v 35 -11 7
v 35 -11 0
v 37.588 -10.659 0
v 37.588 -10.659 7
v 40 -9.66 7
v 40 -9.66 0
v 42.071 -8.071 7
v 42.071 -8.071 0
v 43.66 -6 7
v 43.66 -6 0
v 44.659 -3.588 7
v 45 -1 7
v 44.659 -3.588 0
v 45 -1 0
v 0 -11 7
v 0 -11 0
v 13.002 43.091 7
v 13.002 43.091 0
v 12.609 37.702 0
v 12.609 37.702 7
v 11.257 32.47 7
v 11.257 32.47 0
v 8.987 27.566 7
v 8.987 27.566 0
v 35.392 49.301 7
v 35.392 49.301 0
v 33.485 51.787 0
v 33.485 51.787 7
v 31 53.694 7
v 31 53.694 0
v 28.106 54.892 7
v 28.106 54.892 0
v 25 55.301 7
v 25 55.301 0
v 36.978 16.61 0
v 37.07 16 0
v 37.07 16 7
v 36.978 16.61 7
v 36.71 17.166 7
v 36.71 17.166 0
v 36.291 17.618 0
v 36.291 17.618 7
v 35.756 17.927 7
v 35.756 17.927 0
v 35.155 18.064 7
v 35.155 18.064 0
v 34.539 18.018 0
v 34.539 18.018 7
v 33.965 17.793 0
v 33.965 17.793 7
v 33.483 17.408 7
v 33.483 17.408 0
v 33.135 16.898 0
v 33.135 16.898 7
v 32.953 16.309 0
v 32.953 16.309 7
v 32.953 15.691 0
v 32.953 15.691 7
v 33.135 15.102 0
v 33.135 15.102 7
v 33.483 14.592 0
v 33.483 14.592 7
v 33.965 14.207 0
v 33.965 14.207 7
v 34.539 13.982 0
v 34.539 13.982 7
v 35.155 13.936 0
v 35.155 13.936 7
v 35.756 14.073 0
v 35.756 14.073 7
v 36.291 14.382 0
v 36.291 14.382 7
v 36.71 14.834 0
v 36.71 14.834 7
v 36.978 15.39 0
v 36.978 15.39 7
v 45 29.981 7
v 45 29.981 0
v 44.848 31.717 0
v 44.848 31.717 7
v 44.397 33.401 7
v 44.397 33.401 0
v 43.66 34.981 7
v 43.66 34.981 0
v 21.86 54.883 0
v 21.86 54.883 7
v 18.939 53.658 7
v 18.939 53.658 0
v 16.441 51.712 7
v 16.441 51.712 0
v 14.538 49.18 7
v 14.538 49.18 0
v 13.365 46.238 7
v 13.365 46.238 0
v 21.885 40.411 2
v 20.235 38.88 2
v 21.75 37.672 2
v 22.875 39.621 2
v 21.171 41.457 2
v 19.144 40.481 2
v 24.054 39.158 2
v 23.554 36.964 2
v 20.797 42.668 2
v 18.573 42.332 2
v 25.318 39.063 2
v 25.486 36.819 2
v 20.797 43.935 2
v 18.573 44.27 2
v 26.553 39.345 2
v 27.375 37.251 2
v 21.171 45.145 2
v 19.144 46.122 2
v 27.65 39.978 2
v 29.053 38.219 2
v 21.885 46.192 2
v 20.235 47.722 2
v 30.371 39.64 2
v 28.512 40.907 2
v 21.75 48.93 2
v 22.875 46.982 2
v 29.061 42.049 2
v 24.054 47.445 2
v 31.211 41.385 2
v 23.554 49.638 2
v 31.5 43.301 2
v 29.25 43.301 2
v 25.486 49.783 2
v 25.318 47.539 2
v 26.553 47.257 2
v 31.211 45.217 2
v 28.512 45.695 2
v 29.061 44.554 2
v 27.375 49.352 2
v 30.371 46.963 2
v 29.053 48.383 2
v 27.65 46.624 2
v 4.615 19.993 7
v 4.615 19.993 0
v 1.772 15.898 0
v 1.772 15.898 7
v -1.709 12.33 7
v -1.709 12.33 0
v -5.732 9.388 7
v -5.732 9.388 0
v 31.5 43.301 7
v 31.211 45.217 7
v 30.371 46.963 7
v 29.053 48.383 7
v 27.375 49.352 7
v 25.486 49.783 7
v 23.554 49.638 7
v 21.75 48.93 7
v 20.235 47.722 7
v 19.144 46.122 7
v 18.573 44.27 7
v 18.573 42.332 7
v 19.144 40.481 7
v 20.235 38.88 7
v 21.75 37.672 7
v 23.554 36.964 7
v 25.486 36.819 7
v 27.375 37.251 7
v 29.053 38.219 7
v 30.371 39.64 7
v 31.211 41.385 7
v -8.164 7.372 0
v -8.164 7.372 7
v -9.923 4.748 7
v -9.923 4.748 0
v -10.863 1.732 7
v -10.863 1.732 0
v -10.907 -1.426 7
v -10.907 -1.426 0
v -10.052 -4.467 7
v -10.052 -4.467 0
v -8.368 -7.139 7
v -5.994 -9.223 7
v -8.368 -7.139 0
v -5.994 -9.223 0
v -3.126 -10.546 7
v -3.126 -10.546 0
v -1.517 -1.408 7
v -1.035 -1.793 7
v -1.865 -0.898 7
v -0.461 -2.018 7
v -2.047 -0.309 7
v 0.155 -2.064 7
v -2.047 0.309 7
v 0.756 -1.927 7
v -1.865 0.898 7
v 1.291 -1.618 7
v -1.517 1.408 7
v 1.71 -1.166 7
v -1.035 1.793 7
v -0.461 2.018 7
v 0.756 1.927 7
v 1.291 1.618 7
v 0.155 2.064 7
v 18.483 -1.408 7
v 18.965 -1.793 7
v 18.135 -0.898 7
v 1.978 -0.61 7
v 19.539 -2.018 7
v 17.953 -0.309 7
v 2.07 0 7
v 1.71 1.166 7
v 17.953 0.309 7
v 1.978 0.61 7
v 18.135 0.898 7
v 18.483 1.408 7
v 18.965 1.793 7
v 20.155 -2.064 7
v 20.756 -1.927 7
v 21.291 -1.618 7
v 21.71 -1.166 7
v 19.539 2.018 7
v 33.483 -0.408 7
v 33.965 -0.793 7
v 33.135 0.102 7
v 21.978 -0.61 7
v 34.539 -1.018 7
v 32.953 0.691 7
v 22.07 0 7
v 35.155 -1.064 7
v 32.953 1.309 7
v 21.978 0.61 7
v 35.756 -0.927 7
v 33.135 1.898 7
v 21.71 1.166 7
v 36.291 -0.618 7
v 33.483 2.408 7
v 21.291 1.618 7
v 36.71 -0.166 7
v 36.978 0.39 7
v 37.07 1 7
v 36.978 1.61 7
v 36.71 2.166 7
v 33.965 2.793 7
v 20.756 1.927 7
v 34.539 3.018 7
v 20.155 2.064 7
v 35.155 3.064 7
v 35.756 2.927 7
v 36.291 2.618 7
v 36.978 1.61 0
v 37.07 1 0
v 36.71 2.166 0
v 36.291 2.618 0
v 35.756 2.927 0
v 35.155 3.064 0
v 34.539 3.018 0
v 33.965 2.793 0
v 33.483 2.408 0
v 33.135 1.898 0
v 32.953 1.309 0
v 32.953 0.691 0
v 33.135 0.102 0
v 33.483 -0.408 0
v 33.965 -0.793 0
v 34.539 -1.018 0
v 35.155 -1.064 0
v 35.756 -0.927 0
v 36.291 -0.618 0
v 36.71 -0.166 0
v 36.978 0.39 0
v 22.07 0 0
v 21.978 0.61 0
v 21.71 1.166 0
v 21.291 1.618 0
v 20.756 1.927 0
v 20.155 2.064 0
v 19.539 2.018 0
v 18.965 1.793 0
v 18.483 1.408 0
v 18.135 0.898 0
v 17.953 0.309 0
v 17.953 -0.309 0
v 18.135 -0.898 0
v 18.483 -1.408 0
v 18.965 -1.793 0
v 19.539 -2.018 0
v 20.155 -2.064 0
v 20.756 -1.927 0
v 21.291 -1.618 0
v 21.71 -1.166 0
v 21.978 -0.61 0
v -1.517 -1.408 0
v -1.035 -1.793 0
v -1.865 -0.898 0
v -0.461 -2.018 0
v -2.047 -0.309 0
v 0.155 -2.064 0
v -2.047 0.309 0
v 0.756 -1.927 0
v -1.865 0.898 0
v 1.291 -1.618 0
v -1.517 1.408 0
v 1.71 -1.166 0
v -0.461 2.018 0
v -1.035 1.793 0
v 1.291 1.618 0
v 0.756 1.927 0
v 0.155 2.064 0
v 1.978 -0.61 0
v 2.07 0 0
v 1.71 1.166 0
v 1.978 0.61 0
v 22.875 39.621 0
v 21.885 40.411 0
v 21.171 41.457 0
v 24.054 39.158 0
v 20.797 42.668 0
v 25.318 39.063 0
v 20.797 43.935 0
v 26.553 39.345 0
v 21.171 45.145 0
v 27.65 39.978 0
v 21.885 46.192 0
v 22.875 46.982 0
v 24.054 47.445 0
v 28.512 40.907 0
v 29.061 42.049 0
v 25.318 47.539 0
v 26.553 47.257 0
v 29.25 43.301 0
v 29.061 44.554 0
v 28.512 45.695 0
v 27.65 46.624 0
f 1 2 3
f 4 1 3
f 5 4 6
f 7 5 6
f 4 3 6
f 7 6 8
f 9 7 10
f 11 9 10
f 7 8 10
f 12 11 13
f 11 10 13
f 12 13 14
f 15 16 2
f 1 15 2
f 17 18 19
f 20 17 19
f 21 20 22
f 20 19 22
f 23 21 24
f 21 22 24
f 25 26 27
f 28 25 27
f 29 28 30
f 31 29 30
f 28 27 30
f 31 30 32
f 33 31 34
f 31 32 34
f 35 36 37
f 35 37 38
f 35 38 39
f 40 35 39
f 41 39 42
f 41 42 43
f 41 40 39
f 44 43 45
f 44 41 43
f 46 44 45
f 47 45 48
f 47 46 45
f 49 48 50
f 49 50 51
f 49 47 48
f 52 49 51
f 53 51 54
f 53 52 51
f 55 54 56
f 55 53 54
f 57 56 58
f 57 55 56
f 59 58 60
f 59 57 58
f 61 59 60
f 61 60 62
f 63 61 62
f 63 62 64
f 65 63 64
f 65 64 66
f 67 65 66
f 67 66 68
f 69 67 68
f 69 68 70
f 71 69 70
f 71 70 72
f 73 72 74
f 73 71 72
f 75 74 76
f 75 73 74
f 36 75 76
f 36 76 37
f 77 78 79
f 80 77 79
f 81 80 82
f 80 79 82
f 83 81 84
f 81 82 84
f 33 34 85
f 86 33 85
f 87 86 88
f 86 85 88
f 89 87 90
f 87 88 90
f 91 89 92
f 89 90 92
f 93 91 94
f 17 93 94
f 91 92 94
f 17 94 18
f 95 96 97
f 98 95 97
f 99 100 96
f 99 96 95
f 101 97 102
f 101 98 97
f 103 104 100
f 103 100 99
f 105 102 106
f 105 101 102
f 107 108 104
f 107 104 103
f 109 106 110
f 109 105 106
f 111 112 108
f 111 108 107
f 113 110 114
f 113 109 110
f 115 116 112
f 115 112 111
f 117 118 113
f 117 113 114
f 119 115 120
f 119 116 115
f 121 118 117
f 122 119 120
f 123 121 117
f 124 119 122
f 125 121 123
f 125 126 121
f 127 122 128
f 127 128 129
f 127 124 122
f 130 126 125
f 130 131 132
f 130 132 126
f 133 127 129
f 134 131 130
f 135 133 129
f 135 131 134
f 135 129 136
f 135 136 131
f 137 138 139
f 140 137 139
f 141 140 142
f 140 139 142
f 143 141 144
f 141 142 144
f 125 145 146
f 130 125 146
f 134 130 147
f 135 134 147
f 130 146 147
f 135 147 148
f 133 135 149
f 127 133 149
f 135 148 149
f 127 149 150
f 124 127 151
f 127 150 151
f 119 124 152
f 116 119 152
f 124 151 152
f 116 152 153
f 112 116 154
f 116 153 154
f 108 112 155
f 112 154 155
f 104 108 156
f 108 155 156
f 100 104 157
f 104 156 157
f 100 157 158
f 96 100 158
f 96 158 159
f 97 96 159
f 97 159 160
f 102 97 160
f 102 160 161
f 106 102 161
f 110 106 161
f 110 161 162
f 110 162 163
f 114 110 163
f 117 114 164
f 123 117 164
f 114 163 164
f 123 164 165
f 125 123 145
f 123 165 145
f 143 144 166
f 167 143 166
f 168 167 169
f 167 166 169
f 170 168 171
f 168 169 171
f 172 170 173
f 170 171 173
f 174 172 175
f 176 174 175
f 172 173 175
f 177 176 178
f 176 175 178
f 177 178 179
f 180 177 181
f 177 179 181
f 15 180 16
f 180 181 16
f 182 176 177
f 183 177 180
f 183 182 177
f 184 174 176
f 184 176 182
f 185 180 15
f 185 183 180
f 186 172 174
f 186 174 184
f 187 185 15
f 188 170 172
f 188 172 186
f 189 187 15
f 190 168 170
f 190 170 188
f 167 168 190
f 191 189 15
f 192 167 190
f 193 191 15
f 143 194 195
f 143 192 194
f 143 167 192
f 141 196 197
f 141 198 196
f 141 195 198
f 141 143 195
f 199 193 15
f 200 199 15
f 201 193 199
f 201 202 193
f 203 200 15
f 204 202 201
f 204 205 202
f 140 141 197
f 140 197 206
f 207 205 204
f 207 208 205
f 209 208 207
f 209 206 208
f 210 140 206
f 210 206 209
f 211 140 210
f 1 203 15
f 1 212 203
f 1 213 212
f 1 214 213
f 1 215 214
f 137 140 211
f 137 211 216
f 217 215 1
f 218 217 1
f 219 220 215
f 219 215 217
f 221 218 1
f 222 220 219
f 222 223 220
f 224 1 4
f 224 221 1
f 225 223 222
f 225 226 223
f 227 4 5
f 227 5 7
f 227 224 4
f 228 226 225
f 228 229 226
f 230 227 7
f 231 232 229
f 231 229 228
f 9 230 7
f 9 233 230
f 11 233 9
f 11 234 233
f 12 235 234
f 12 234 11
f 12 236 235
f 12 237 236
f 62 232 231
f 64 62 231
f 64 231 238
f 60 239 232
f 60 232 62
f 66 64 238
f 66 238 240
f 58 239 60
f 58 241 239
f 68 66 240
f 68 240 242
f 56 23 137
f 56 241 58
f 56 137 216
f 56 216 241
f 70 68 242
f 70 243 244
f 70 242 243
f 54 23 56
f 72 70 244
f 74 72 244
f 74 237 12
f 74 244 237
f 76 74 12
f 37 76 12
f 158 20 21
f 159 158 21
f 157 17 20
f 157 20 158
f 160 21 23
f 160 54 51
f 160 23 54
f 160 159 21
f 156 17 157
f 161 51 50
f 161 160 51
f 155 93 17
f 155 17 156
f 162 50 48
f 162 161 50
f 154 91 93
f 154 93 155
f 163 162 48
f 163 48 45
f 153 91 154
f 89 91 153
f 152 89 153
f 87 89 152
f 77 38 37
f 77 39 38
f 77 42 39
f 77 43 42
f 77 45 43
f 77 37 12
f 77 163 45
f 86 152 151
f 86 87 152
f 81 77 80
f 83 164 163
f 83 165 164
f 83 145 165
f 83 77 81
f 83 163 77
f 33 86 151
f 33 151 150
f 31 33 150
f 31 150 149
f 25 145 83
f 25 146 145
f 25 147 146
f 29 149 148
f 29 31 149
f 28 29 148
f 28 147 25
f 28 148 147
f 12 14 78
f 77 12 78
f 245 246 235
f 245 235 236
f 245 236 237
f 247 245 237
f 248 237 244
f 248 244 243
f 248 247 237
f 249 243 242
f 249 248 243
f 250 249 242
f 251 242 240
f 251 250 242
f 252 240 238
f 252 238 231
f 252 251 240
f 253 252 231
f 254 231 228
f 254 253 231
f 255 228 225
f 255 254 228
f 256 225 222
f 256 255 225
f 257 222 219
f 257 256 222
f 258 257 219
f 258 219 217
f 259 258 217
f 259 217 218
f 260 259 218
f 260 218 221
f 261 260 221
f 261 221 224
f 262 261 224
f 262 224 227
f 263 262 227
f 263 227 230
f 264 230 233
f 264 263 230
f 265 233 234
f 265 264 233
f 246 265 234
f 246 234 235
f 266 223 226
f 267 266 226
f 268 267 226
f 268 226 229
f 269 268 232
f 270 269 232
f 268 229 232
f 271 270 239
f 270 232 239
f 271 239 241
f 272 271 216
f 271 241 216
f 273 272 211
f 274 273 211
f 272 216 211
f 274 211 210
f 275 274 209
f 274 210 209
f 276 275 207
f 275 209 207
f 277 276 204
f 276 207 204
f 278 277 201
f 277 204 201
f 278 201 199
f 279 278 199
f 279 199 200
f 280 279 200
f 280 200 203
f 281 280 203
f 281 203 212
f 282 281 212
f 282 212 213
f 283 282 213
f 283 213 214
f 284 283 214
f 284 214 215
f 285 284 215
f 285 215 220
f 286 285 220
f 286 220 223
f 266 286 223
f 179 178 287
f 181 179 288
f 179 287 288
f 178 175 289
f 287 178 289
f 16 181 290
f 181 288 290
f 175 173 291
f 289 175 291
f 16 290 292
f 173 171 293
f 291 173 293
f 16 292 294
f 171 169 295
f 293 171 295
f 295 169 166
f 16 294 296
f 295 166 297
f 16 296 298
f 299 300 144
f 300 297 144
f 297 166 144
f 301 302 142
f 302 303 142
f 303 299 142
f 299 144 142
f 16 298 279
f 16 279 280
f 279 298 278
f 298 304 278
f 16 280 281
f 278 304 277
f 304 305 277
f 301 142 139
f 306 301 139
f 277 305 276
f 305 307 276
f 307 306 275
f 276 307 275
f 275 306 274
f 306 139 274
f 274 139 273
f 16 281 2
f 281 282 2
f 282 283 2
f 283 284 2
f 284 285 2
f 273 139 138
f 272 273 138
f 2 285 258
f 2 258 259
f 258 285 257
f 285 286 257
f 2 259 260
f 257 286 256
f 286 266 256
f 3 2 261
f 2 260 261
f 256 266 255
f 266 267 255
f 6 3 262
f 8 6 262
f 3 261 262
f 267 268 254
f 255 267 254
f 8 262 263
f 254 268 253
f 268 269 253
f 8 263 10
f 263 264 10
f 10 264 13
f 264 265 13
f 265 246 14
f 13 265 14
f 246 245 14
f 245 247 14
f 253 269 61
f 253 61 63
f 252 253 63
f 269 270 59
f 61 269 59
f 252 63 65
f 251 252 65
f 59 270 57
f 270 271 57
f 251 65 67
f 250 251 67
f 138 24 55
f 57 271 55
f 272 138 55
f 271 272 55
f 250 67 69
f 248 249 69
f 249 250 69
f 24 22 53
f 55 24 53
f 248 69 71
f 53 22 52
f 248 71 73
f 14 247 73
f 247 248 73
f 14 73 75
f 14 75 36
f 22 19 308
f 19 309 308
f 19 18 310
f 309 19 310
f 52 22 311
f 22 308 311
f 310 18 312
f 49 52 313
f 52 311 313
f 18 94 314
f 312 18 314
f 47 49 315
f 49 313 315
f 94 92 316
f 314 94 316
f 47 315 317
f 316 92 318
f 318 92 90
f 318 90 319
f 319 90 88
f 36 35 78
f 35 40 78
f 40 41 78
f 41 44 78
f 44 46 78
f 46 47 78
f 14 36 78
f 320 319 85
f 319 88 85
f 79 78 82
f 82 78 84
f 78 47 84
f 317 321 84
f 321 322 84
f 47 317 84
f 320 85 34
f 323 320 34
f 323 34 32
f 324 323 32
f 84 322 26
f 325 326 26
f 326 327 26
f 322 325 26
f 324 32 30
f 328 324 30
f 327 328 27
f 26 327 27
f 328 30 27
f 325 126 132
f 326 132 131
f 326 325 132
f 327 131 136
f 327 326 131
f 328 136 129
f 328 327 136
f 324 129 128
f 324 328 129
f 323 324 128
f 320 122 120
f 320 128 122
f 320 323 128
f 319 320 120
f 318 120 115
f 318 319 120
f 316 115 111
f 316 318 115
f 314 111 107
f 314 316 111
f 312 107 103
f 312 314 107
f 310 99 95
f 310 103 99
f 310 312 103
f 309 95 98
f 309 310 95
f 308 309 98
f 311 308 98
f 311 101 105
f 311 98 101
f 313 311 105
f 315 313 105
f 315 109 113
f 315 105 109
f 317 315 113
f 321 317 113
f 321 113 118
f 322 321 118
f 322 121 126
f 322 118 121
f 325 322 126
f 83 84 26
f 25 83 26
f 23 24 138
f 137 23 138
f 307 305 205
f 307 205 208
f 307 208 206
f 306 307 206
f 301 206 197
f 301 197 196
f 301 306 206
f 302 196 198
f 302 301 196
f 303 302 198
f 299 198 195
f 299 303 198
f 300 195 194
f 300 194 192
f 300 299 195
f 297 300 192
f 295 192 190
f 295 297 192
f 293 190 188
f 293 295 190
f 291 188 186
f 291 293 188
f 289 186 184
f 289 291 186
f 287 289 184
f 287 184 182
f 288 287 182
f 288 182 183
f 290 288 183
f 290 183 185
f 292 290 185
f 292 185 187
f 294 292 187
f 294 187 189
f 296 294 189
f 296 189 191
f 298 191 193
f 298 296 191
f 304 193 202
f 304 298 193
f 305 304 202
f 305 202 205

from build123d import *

# Parameters (mm, degrees)
SKETCH_1_R          = 2.07
SKETCH_1_R_2        = 4.25
EXTRUDE_1_DEPTH     = 7
SKETCH_2_R          = 6.5
CUT_EXTRUDE_1_DEPTH = 5
SKETCH_3_R          = 2.07
CUT_EXTRUDE_2_DEPTH = 72.639587412


with BuildPart() as part:
    # 草图1 → 凸台-拉伸1 (new body)
    with BuildSketch(Plane.XY):
        with BuildLine():
            ThreePointArc((13.001837611, 43.091271905), (12.051039078, 35.055565267), (8.987193751, 27.566276194))
            Line((8.987193751, 27.566276194), (4.614556012, 19.992645468))
            ThreePointArc((4.614556012, 19.992645468), (0.106016193, 14.041662919), (-5.732396759, 9.388270735))
            ThreePointArc((-5.732396759, 9.388270735), (-10.589404565, -2.977332859), (0, -11))
            Line((0, -11), (35, -11))
            ThreePointArc((35, -11), (42.071067812, -8.071067812), (45, -1))
            Line((45, -1), (45, 29.980762114))
            ThreePointArc((45, 29.980762114), (44.659258263, 32.568952565), (43.660254038, 34.980762114))
            Line((43.660254038, 34.980762114), (35.392304845, 49.301270189))
            ThreePointArc((35.392304845, 49.301270189), (31, 53.693575035), (25, 55.301270189))
            ThreePointArc((25, 55.301270189), (16.440795031, 51.711978263), (13.001837611, 43.091271905))
        make_face()
        Circle(SKETCH_1_R, mode=Mode.SUBTRACT)
        with Locations((35, 1)):
            Circle(SKETCH_1_R, mode=Mode.SUBTRACT)
        with Locations((35, 16)):
            Circle(SKETCH_1_R, mode=Mode.SUBTRACT)
        with Locations((25, 43.301270189)):
            Circle(SKETCH_1_R_2, mode=Mode.SUBTRACT)
    extrude(amount=EXTRUDE_1_DEPTH)

    # 草图2 → 切除-拉伸1 (cut)
    with BuildSketch(Plane.XY.offset(7)):
        with Locations((25, 43.301270189)):
            Circle(SKETCH_2_R)
    extrude(amount=-CUT_EXTRUDE_1_DEPTH, mode=Mode.SUBTRACT)

    # 草图3 → 切除-拉伸2 (cut, through all)
    with BuildSketch(Plane.XY.offset(7)):
        with Locations((20, 0)):
            Circle(SKETCH_3_R)
    extrude(amount=-CUT_EXTRUDE_2_DEPTH, mode=Mode.SUBTRACT)


solid = part.part
